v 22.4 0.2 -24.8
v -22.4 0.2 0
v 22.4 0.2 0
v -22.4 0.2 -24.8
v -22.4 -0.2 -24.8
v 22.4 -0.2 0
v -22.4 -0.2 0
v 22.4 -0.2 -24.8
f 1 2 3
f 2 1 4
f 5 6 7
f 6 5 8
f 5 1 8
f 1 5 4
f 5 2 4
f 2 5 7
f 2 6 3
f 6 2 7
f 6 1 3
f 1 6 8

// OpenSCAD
// file: ../p/box.scad
use <../lib.scad>
function ldraw_lib__box() = [
// 0 Box 6 (six faces)
// 0 Name: box.dat
// 0 Author: James Jessiman
// 0 !LDRAW_ORG Primitive UPDATE 2002-05
// 0 !LICENSE Licensed under CC BY 2.0 and CC BY 4.0 : see CAreadme.txt
// 
// 0 BFC CERTIFY CCW
  [0,"BFC","CERTIFY"],
  [0,"BFC","CCW"],
// 
// 0 !HISTORY 2002-08-22 [sbliss] Applied BFC
// 0 !HISTORY 2002-11-30 [PTadmin] Official Update 2002-05
// 0 !HISTORY 2007-06-24 [PTadmin] Header formatted for Contributor Agreement
// 0 !HISTORY 2008-07-01 [PTadmin] Official Update 2008-01
// 
// 
// 2 24 1 1 1 -1 1 1
  [2,24,1,1,1,-1,1,1],
// 2 24 -1 1 1 -1 1 -1
  [2,24,-1,1,1,-1,1,-1],
// 2 24 -1 1 -1 1 1 -1
  [2,24,-1,1,-1,1,1,-1],
// 2 24 1 1 -1 1 1 1
  [2,24,1,1,-1,1,1,1],
// 2 24 1 -1 1 -1 -1 1
  [2,24,1,-1,1,-1,-1,1],
// 2 24 -1 -1 1 -1 -1 -1
  [2,24,-1,-1,1,-1,-1,-1],
// 2 24 -1 -1 -1 1 -1 -1
  [2,24,-1,-1,-1,1,-1,-1],
// 2 24 1 -1 -1 1 -1 1
  [2,24,1,-1,-1,1,-1,1],
// 2 24 1 -1 1 1 1 1
  [2,24,1,-1,1,1,1,1],
// 2 24 -1 -1 1 -1 1 1
  [2,24,-1,-1,1,-1,1,1],
// 2 24 1 -1 -1 1 1 -1
  [2,24,1,-1,-1,1,1,-1],
// 2 24 -1 -1 -1 -1 1 -1
  [2,24,-1,-1,-1,-1,1,-1],
// 4 16 1 1 1 1 1 -1 -1 1 -1 -1 1 1
  [4,16,1,1,1,1,1,-1,-1,1,-1,-1,1,1],
// 4 16 -1 -1 -1 1 -1 -1 1 -1 1 -1 -1 1
  [4,16,-1,-1,-1,1,-1,-1,1,-1,1,-1,-1,1],
// 4 16 -1 -1 1 1 -1 1 1 1 1 -1 1 1
  [4,16,-1,-1,1,1,-1,1,1,1,1,-1,1,1],
// 4 16 -1 -1 -1 -1 -1 1 -1 1 1 -1 1 -1
  [4,16,-1,-1,-1,-1,-1,1,-1,1,1,-1,1,-1],
// 4 16 1 -1 -1 -1 -1 -1 -1 1 -1 1 1 -1
  [4,16,1,-1,-1,-1,-1,-1,-1,1,-1,1,1,-1],
// 4 16 1 -1 1 1 -1 -1 1 1 -1 1 1 1
  [4,16,1,-1,1,1,-1,-1,1,1,-1,1,1,1],
// 0
];
makepoly(ldraw_lib__box(), line=0.2);
// main file
use <../lib.scad>
use <../p/box.scad>
function ldraw_lib__u8038() = [
// 0 ~Mursten Glass for Window  1 x  6 x  3 Triple
// 0 Name: u8038.dat
// 0 Author: Steffen [Steffen]
// 0 !LDRAW_ORG Part UPDATE 2019-02
// 0 !LICENSE Licensed under CC BY 2.0 and CC BY 4.0 : see CAreadme.txt
// 
// 0 BFC CERTIFY CCW
  [0,"BFC","CERTIFY"],
  [0,"BFC","CCW"],
// 
// 0 !CATEGORY Window
// 0 !KEYWORDS Automatic Binding Brick
// 
// 0 !CMDLINE -c47
// 
// 0 !HISTORY 2019-09-09 [PTadmin] Official Update 2019-02
// 
// 
// 1 16 0 31 0 56 0 0 0 0 31 0 0.5 0 box.dat
  [1,16,0,31,0,56,0,0,0,0,31,0,0.5,0, ldraw_lib__box()],
];
makepoly(ldraw_lib__u8038(), line=0.2);
